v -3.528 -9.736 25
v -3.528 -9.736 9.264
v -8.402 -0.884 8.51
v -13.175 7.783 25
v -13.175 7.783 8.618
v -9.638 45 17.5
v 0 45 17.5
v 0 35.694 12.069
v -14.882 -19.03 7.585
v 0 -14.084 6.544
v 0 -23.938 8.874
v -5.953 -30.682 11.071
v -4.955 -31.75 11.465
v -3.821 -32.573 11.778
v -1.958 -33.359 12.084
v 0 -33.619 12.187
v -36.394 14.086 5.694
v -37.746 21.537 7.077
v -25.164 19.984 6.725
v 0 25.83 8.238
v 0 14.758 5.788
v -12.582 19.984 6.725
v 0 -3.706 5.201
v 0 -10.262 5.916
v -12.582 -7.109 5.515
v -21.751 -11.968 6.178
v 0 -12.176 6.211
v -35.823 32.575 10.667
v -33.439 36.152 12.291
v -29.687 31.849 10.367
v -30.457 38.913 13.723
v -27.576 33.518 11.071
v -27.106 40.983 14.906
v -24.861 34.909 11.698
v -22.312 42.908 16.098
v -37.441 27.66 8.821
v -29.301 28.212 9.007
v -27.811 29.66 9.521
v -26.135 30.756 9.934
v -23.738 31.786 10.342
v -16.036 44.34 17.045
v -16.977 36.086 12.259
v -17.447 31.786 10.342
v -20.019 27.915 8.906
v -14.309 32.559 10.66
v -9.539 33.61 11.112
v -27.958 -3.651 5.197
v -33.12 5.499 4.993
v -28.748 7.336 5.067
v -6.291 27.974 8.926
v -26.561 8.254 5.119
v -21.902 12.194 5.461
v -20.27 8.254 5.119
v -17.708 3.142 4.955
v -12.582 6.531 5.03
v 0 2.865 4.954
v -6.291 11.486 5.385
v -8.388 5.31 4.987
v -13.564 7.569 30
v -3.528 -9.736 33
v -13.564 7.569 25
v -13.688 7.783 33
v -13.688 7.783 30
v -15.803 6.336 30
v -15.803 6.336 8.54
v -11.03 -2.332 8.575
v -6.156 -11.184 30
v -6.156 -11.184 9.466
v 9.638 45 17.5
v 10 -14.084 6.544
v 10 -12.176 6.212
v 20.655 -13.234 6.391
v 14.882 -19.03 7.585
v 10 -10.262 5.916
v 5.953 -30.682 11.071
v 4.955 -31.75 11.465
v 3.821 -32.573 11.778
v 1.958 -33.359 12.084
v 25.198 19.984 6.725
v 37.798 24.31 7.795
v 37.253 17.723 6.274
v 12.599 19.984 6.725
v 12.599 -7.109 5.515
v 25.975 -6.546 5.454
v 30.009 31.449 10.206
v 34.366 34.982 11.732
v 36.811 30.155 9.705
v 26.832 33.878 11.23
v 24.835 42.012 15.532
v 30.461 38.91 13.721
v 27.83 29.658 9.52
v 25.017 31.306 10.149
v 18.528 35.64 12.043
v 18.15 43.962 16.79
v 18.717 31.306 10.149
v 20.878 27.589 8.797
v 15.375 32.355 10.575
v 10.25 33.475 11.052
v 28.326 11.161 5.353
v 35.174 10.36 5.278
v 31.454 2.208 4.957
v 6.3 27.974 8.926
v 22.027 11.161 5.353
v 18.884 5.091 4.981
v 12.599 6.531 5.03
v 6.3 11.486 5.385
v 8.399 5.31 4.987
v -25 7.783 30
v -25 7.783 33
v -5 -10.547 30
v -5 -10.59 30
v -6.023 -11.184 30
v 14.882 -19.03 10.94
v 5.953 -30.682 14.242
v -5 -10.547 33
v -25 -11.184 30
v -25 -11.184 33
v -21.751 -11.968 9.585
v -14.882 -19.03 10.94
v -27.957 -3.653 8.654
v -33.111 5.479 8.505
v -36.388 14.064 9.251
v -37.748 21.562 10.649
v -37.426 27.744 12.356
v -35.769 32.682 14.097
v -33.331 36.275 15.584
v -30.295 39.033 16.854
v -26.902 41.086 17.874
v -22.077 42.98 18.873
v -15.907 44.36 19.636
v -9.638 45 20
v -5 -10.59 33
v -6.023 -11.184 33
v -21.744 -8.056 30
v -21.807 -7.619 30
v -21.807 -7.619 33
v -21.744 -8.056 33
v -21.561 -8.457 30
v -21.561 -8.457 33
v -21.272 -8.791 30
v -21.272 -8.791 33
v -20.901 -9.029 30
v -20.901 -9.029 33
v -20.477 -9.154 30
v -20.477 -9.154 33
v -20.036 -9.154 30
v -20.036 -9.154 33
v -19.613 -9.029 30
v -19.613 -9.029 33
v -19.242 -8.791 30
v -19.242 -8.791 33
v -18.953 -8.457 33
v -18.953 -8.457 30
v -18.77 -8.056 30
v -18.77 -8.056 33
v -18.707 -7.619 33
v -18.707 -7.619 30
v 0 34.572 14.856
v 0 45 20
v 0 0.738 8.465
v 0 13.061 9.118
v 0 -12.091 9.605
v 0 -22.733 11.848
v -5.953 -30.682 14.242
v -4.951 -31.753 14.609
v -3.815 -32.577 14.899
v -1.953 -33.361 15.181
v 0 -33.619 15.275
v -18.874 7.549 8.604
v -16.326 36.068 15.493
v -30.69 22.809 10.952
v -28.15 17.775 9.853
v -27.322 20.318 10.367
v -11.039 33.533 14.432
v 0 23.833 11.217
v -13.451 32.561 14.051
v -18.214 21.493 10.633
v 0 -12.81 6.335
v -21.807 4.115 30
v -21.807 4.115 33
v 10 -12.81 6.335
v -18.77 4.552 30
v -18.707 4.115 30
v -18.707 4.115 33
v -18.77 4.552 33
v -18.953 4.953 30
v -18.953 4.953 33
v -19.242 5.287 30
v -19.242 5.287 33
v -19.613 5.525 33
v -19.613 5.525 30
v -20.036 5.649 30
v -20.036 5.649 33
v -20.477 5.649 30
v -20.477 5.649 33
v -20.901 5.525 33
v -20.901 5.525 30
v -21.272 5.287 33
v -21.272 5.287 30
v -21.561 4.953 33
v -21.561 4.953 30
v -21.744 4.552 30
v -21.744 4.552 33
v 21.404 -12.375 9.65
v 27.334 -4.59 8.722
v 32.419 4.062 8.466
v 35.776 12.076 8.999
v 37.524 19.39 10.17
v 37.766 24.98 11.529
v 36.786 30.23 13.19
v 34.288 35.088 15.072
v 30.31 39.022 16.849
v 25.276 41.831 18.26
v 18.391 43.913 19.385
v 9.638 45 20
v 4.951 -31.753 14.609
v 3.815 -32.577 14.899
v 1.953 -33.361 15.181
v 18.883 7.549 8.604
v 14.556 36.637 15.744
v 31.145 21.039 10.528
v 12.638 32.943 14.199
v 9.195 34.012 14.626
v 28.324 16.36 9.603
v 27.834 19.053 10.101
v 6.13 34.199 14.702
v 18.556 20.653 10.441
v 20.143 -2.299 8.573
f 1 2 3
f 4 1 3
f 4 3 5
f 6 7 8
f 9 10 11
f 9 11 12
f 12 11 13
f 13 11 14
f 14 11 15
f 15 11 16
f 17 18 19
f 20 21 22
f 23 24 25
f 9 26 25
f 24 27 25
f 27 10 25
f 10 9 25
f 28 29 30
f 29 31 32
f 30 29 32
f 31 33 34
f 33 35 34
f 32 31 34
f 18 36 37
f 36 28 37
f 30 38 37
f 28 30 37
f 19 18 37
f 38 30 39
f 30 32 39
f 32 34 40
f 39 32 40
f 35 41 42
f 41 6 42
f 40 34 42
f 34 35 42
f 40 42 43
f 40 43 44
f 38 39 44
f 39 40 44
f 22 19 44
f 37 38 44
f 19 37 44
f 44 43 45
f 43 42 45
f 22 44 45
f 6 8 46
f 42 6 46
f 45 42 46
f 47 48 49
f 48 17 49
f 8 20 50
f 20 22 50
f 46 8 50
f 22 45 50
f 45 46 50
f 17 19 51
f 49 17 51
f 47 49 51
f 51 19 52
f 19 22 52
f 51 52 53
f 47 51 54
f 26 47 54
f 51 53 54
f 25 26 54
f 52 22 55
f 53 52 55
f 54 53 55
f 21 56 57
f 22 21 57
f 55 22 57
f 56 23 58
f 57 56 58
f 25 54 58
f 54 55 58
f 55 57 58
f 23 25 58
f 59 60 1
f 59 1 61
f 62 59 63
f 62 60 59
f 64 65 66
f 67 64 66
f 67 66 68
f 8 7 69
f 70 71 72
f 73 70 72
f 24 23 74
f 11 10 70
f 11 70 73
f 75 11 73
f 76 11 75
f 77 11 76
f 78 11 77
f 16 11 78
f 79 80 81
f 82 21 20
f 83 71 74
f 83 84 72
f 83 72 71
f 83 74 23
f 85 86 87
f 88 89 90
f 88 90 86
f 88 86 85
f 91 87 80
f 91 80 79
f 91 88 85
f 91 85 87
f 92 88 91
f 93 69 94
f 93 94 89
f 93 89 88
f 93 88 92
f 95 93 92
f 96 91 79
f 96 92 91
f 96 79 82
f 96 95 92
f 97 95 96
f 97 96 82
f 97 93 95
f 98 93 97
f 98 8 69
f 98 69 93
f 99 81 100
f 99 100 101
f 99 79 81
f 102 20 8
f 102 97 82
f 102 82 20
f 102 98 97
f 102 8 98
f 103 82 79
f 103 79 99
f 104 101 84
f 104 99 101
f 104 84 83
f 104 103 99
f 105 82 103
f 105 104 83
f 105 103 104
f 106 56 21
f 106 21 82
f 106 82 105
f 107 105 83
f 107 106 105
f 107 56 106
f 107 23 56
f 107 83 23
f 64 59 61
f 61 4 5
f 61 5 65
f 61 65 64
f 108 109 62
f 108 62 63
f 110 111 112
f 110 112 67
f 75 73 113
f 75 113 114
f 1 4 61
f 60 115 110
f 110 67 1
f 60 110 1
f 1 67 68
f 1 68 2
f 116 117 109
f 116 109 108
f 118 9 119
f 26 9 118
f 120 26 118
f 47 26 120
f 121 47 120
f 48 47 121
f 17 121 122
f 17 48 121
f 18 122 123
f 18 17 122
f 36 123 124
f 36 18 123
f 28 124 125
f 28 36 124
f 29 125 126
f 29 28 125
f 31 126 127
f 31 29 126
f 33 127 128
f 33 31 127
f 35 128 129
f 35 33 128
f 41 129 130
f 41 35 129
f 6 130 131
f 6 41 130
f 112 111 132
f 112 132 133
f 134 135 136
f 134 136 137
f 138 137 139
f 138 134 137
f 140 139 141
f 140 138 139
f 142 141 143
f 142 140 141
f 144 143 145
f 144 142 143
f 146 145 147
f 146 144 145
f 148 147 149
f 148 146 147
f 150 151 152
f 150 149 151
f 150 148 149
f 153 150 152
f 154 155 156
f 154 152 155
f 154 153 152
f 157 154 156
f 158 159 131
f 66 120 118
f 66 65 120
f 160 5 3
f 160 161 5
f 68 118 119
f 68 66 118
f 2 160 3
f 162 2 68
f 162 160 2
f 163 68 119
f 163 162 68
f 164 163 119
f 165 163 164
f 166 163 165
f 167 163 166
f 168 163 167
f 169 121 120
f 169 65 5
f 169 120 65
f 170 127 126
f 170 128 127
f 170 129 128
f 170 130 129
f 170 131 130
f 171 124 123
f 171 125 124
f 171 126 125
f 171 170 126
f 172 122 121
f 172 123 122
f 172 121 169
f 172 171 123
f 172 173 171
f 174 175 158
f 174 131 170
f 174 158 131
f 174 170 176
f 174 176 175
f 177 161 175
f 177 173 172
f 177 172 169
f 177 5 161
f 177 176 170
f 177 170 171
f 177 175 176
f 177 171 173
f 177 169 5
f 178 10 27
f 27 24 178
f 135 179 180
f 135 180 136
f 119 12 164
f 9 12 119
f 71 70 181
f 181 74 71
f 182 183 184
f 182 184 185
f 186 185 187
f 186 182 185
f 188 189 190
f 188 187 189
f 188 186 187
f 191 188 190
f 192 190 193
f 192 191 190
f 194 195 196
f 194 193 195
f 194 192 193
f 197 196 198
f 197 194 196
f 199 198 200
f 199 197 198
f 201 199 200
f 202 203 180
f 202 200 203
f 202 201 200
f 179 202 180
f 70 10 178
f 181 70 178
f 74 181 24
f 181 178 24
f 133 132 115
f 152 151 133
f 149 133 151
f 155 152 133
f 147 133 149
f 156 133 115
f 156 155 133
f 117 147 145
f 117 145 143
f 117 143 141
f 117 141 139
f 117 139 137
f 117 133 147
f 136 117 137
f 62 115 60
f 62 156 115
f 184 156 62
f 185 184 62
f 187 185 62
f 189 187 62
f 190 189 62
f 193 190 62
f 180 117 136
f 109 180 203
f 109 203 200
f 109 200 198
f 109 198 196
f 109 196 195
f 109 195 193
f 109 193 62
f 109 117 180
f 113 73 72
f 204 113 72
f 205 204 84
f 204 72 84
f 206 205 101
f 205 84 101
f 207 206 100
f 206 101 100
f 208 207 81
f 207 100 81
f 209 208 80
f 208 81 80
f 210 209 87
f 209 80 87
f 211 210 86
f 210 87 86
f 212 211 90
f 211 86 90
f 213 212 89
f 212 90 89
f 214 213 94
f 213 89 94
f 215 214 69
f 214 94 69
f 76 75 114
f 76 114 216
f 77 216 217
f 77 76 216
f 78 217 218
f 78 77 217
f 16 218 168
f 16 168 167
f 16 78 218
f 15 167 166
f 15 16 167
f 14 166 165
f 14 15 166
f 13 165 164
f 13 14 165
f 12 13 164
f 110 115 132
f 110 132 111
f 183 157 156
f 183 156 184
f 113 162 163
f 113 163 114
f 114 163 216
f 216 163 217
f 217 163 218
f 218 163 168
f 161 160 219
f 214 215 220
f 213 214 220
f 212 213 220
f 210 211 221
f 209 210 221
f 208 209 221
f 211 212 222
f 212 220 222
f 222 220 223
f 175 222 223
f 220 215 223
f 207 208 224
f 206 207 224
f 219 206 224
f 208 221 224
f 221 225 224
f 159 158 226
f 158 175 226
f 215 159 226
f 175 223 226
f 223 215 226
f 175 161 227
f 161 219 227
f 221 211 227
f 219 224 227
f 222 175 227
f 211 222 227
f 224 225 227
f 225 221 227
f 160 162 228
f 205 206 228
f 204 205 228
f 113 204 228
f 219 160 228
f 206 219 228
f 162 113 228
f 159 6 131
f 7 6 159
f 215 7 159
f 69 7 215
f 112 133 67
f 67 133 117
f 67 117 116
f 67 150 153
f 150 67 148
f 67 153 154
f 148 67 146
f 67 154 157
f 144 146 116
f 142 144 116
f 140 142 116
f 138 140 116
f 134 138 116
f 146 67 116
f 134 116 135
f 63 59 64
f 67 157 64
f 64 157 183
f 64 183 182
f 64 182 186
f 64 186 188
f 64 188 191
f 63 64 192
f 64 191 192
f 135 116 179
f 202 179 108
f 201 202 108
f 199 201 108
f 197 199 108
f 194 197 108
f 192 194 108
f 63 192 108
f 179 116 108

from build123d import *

# Parameters (mm, degrees)
SKETCH1_W               = 90
SKETCH1_H               = 90
BOSS_EXTRUDE1_DEPTH     = 20
CUT_EXTRUDE1_DEPTH      = 67.708320321
CUT_EXTRUDE1_DEPTH_BACK = 67.708320321
CUT_EXTRUDE2_DEPTH      = 67.708320486
CUT_EXTRUDE2_DEPTH_BACK = 67.708320486
CUT_EXTRUDE13_DEPTH     = 10
BOSS_EXTRUDE5_START     = 6.5
BOSS_EXTRUDE5_DEPTH     = 26.5
BOSS_EXTRUDE7_START     = -25
SKETCH26_W              = 3
SKETCH26_H              = 18.966666926
BOSS_EXTRUDE7_DEPTH     = 20
CUT_EXTRUDE23_START     = 25
SKETCH28_R              = 1.55
CUT_EXTRUDE23_DEPTH     = 10
CUT_EXTRUDE24_START     = 35
CUT_EXTRUDE24_DEPTH     = 10


with BuildPart() as part:
    # Sketch1 → Boss-Extrude1 (new body)
    with BuildSketch(Plane.XY):
        Rectangle(SKETCH1_W, SKETCH1_H)
    extrude(amount=BOSS_EXTRUDE1_DEPTH)

    # Sketch2 → Cut-Extrude1 (cut, two sides)
    with BuildSketch(Plane(origin=(0, 0, 0), x_dir=(0, 0, -1), z_dir=(1, 0, 0))) as cut_extrude1_sk:
        with BuildLine():
            Line((0, -45), (0, 45))
            Line((0, 45), (-17.5, 45))
            add(Edge.make_bspline(
                [(-17.5, 45), (1.11526928, 18.330109849), (-2.773030501, -17.812088562), (-17.5, -45)],
                knots=[0, 0, 0, 0, 1, 1, 1, 1], degree=3))
            Line((-17.5, -45), (0, -45))
        make_face()
        with BuildLine():
            add(Edge.make_bspline(
                [(-20, 45), (3.100953483, 4.754137608), (-20, -45)],
                knots=[0, 0, 0, 1, 1, 1], degree=2))
            Line((-20, -45), (-20, 45))
        make_face()
    extrude(amount=CUT_EXTRUDE1_DEPTH, mode=Mode.SUBTRACT)
    extrude(cut_extrude1_sk.sketch, amount=-CUT_EXTRUDE1_DEPTH_BACK, mode=Mode.SUBTRACT)

    # Sketch3 → Cut-Extrude2 (cut, two sides)
    with BuildSketch(Plane.XY) as cut_extrude2_sk:
        with BuildLine():
            ThreePointArc((5.952933229, -30.681551854), (0, -33.619470534), (-5.952933229, -30.681551854))
            Line((-5.952933229, -30.681551854), (-14.882333073, -19.02982596))
            add(Edge.make_bspline(
                [(-14.882333073, -19.02982596), (-33.37703632, -2.819308001), (-57.954503959, 42.329469412), (-9.638427065, 45)],
                knots=[0, 0, 0, 0, 0.942687649, 0.942687649, 0.942687649, 0.942687649], degree=3))
            Line((-9.638427065, 45), (-45, 45))
            Line((-45, 45), (-45, -45))
            Line((-45, -45), (45, -45))
            Line((45, -45), (45, 45))
            Line((45, 45), (9.638427065, 45))
            add(Edge.make_bspline(
                [(14.882333073, -19.02982596), (33.37703632, -2.819308001), (57.954503959, 42.329469412), (9.638427065, 45)],
                knots=[0, 0, 0, 0, 0.942687649, 0.942687649, 0.942687649, 0.942687649], degree=3))
            Line((14.882333073, -19.02982596), (5.952933229, -30.681551854))
        make_face()
    extrude(amount=CUT_EXTRUDE2_DEPTH, mode=Mode.SUBTRACT)
    extrude(cut_extrude2_sk.sketch, amount=-CUT_EXTRUDE2_DEPTH_BACK, mode=Mode.SUBTRACT)

    # Sketch15 → Cut-Extrude13 (cut)
    with BuildSketch(Plane(origin=(0, 0, 0), x_dir=(0, 0, -1), z_dir=(1, 0, 0))):
        Polygon((-6.544274822, -14.084003466), (-5.916371018, -10.261977823), (-5.185386391, -14.084003466), align=None)
    extrude(amount=CUT_EXTRUDE13_DEPTH, mode=Mode.SUBTRACT)

    # Sketch24 → Boss-Extrude5 (add)
    with BuildSketch(Plane.XY.offset(BOSS_EXTRUDE5_START)):
        Polygon((-15.802792048, 6.336123183), (-6.155905041, -11.183510692), (-3.52795996, -9.736477641), (-13.174846966, 7.783156234), align=None)
    extrude(amount=BOSS_EXTRUDE5_DEPTH)

    # Sketch26 → Boss-Extrude7 (add)
    with BuildSketch(Plane(origin=(0, 0, 0), x_dir=(0, 0, -1), z_dir=(1, 0, 0)).offset(BOSS_EXTRUDE7_START)):
        with Locations((-31.5, -1.700177229)):
            Rectangle(SKETCH26_W, SKETCH26_H)
    extrude(amount=BOSS_EXTRUDE7_DEPTH)

    # Sketch28 → Cut-Extrude23 (cut)
    with BuildSketch(Plane.XY.offset(CUT_EXTRUDE23_START)):
        with Locations((-20.256840538, 4.115140616)):
            Circle(SKETCH28_R)
        with BuildLine():
            Line((-18.706840538, -7.619333671), (-18.706840538, 4.115140616))
            ThreePointArc((-18.706840538, 4.115140616), (-20.256840538, 2.565140616), (-21.806840538, 4.115140616))
            Line((-21.806840538, 4.115140616), (-21.806840538, -7.619333671))
            ThreePointArc((-21.806840538, -7.619333671), (-20.256840538, -6.069333671), (-18.706840538, -7.619333671))
        make_face()
        with Locations((-20.256840538, -7.619333671)):
            Circle(SKETCH28_R)
    extrude(amount=CUT_EXTRUDE23_DEPTH, mode=Mode.SUBTRACT)

    # Sketch29 → Cut-Extrude24 (cut)
    with BuildSketch(Plane.XY.offset(CUT_EXTRUDE24_START)):
        Polygon((-3.77618872, 7.783156234), (-3.52795996, -9.736477641), (-13.688384135, 7.783156234), align=None)
        Polygon((-7.35673341, -11.956955683), (-3.65207434, -11.956955683), (-3.52795996, -9.736477641), align=None)
    extrude(amount=-CUT_EXTRUDE24_DEPTH, mode=Mode.SUBTRACT)


solid = part.part
